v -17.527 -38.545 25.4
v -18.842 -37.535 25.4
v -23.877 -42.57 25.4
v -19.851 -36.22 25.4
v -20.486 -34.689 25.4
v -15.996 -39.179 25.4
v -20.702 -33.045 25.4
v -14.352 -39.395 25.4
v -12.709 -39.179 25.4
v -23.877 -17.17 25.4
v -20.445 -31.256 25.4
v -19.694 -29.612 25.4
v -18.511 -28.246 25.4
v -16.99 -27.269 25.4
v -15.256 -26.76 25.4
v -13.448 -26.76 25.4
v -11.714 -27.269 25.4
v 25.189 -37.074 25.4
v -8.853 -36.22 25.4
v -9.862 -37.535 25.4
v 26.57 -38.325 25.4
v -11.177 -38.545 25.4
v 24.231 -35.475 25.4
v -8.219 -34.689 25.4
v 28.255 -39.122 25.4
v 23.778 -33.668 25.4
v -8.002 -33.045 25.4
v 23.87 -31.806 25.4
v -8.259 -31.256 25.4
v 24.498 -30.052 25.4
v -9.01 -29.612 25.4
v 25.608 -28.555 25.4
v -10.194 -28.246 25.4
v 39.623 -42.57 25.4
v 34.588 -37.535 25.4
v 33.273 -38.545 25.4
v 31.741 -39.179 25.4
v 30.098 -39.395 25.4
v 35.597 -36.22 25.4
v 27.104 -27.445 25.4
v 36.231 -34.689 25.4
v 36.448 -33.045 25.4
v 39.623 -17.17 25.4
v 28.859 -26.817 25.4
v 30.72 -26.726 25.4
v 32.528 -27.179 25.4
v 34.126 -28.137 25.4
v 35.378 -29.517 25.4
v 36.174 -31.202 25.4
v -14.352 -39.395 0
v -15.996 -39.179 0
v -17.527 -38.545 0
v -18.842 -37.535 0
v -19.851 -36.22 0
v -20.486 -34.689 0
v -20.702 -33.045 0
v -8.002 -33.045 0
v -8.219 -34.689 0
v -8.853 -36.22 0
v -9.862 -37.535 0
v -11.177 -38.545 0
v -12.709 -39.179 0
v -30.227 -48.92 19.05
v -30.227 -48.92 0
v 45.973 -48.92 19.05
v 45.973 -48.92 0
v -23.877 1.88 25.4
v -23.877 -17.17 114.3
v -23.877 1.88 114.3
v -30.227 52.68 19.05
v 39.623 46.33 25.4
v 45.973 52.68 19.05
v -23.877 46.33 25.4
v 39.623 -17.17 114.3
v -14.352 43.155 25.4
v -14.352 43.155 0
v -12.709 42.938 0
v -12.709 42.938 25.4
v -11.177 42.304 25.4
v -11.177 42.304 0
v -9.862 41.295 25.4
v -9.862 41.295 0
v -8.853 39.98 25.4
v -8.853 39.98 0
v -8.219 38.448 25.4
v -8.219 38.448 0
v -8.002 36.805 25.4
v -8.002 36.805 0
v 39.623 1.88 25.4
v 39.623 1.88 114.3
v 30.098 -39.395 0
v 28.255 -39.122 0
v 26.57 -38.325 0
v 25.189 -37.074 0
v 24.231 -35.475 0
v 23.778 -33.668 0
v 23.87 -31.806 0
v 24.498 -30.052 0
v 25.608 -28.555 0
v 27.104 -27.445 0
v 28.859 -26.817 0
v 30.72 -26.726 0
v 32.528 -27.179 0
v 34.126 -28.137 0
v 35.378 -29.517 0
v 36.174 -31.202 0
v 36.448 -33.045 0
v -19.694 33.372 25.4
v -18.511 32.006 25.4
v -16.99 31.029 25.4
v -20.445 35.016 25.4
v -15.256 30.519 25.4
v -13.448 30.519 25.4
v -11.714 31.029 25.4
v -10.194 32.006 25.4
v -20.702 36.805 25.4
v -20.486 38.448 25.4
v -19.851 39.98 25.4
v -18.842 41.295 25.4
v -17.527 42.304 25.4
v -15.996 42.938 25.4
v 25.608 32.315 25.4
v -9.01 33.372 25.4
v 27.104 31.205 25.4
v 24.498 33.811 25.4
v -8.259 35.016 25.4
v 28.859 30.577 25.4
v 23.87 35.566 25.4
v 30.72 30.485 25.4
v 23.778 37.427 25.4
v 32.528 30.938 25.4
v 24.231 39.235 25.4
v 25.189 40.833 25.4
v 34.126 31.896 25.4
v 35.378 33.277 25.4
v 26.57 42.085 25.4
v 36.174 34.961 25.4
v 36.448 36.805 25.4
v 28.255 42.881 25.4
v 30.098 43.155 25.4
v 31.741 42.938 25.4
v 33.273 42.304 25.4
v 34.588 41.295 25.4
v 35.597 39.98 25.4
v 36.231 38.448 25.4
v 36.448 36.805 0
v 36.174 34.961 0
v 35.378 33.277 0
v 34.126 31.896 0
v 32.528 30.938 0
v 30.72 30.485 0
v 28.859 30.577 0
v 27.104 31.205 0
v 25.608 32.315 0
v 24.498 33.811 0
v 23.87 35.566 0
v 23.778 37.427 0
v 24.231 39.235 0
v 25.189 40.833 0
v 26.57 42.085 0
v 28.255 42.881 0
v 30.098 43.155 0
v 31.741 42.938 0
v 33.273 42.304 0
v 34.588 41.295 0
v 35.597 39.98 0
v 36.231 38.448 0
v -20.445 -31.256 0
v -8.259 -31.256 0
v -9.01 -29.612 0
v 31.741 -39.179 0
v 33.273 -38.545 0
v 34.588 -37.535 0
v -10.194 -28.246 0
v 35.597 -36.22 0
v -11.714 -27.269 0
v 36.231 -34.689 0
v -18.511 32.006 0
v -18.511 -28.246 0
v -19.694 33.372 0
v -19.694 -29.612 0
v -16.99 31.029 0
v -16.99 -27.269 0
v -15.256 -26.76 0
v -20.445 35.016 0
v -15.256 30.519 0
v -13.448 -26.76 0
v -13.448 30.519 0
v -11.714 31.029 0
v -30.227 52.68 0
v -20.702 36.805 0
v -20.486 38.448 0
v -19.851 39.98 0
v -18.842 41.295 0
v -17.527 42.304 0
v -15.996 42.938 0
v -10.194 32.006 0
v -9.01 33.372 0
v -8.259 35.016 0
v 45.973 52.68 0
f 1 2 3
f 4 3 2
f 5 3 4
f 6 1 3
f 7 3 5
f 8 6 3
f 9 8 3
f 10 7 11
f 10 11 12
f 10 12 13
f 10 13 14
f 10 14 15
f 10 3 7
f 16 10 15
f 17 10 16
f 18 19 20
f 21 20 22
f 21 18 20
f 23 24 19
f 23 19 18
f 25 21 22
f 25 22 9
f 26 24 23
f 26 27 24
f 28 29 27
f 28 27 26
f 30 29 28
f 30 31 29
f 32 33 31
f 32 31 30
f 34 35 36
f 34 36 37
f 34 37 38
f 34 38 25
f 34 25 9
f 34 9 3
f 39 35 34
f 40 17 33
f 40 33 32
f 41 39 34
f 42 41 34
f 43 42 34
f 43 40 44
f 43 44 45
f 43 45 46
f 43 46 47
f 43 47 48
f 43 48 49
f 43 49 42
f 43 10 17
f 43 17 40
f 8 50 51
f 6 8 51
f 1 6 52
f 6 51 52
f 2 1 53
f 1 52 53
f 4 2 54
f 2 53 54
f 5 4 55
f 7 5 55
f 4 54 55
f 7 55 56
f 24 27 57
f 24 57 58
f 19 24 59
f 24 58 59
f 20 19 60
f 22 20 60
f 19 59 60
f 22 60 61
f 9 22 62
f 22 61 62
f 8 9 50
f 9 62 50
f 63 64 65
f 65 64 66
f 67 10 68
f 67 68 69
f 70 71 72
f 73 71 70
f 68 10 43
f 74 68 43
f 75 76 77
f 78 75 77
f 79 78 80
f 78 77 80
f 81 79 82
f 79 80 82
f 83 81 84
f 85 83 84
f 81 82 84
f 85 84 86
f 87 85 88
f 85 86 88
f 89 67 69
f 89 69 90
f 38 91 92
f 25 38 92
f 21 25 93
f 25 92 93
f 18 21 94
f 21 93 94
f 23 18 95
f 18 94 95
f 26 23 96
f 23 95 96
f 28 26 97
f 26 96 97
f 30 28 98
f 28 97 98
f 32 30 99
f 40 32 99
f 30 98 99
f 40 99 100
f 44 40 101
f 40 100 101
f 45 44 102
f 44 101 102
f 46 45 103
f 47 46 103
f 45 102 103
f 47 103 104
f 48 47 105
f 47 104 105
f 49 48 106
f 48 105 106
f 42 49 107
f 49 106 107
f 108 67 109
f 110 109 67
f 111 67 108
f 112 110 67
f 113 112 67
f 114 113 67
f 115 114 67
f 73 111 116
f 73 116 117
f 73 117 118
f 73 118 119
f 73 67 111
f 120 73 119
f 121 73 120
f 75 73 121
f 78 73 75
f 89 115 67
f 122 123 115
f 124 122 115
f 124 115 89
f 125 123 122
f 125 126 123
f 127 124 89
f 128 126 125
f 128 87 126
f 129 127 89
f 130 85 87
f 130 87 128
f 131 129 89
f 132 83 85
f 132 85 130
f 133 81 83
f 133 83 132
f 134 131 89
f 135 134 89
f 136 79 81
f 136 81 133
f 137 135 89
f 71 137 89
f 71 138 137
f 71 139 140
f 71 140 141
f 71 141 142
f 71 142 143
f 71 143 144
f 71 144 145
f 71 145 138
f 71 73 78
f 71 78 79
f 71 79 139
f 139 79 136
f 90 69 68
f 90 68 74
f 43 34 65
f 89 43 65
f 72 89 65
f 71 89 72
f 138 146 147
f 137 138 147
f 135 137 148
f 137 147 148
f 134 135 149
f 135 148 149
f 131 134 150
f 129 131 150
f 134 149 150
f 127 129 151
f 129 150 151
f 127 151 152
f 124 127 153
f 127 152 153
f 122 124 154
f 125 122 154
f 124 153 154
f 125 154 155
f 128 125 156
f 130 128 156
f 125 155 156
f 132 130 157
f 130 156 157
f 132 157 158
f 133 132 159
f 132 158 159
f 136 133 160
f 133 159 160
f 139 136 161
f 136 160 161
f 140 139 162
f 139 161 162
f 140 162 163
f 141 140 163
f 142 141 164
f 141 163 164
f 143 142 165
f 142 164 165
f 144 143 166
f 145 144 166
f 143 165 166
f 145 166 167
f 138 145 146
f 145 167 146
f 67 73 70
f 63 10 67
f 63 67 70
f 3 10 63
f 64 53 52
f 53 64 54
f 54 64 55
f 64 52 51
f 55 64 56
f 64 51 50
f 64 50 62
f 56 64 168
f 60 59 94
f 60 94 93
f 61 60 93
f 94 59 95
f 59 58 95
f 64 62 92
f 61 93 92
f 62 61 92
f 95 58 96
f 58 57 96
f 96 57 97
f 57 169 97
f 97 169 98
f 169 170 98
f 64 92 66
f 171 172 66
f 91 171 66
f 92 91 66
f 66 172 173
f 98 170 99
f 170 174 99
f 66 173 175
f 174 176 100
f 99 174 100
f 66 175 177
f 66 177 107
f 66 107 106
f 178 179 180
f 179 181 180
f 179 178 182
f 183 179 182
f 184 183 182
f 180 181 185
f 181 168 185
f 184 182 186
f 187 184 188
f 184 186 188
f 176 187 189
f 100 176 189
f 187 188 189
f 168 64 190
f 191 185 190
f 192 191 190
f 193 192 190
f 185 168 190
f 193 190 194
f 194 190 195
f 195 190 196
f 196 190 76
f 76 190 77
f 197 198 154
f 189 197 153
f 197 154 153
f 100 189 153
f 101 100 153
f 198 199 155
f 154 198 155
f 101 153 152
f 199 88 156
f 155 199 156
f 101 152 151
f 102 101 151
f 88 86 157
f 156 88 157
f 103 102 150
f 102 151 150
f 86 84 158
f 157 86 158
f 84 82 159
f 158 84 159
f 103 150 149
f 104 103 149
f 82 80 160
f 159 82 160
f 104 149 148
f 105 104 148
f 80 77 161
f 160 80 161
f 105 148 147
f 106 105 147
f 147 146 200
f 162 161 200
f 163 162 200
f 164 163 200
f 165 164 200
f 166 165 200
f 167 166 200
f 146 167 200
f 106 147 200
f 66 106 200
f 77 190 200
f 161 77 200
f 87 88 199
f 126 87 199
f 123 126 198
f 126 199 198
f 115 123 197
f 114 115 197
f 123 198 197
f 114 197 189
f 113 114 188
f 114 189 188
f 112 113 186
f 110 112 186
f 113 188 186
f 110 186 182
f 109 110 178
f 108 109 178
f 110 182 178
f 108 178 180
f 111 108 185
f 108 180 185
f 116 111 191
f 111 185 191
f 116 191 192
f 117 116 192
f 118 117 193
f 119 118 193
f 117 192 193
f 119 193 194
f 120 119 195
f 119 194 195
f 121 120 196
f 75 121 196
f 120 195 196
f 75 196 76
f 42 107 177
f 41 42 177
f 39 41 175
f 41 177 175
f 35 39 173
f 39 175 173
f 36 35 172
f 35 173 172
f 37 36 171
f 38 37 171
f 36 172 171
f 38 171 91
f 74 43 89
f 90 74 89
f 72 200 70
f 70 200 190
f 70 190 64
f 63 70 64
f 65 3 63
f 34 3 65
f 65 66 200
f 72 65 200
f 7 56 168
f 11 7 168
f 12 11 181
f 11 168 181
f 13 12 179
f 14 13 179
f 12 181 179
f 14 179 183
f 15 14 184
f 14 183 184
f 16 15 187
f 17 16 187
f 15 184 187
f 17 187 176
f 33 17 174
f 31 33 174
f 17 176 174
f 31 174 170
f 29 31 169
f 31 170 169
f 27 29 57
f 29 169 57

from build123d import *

# Parameters (mm, degrees)
F0_W     = 38.1
F0_H     = 19.05
F1_DEPTH = 25.4
F2_SIZE  = 6.35
F3_W     = 63.5
F3_H     = 19.05
F4_DEPTH = 88.9


with BuildPart() as f1:
    # F0 (on Top) → F1 (new body)
    with BuildSketch(Plane.XY):
        with BuildLine():
            Line((30.0978315473, 52.679737395), (7.8728315473, 52.679737395))
            Line((7.8728315473, 52.679737395), (7.8728315473, 20.929737395))
            Line((7.8728315473, 20.929737395), (45.9728315473, 20.929737395))
            Line((45.9728315473, 20.929737395), (45.9728315473, 36.804737395))
            Line((45.9728315473, 36.804737395), (36.4478315473, 36.804737395))
            ThreePointArc((36.4478315473, 36.804737395), (25.6077034867, 32.3146093345), (30.0978315473, 43.154737395))
            Line((30.0978315473, 43.154737395), (30.0978315473, 52.679737395))
        make_face()
        with BuildLine():
            Line((45.9728315473, 52.679737395), (30.0978315473, 52.679737395))
            Line((30.0978315473, 52.679737395), (30.0978315473, 43.154737395))
            ThreePointArc((30.0978315473, 43.154737395), (34.5879596078, 41.2948654556), (36.4478315473, 36.804737395))
            Line((36.4478315473, 36.804737395), (45.9728315473, 36.804737395))
            Line((45.9728315473, 36.804737395), (45.9728315473, 52.679737395))
        make_face()
        with BuildLine():
            Line((7.8728315473, 52.679737395), (-14.3521684527, 52.679737395))
            Line((-14.3521684527, 52.679737395), (-14.3521684527, 43.154737395))
            ThreePointArc((-14.3521684527, 43.154737395), (-9.8620403922, 41.2948654556), (-8.0021684527, 36.804737395))
            ThreePointArc((-8.0021684527, 36.804737395), (-14.3521684527, 30.454737395), (-20.7021684527, 36.804737395))
            Line((-20.7021684527, 36.804737395), (-30.2271684527, 36.804737395))
            Line((-30.2271684527, 36.804737395), (-30.2271684527, 20.929737395))
            Line((-30.2271684527, 20.929737395), (7.8728315473, 20.929737395))
            Line((7.8728315473, 20.929737395), (7.8728315473, 52.679737395))
        make_face()
        with BuildLine():
            Line((-14.3521684527, 52.679737395), (-30.2271684527, 52.679737395))
            Line((-30.2271684527, 52.679737395), (-30.2271684527, 36.804737395))
            Line((-30.2271684527, 36.804737395), (-20.7021684527, 36.804737395))
            ThreePointArc((-20.7021684527, 36.804737395), (-18.8422965133, 41.2948654556), (-14.3521684527, 43.154737395))
            Line((-14.3521684527, 43.154737395), (-14.3521684527, 52.679737395))
        make_face()
        with BuildLine():
            Line((45.9728315473, -48.920262605), (45.9728315473, -33.045262605))
            Line((45.9728315473, -33.045262605), (36.4478315473, -33.045262605))
            ThreePointArc((36.4478315473, -33.045262605), (34.5879596078, -37.5353906655), (30.0978315473, -39.395262605))
            Line((30.0978315473, -39.395262605), (30.0978315473, -48.920262605))
            Line((30.0978315473, -48.920262605), (45.9728315473, -48.920262605))
        make_face()
        with BuildLine():
            Line((45.9728315473, 1.879737395), (7.8728315473, 1.879737395))
            Line((7.8728315473, 1.879737395), (7.8728315473, -48.920262605))
            Line((7.8728315473, -48.920262605), (30.0978315473, -48.920262605))
            Line((30.0978315473, -48.920262605), (30.0978315473, -39.395262605))
            ThreePointArc((30.0978315473, -39.395262605), (25.6077034867, -28.5551345444), (36.4478315473, -33.045262605))
            Line((36.4478315473, -33.045262605), (45.9728315473, -33.045262605))
            Line((45.9728315473, -33.045262605), (45.9728315473, 1.879737395))
        make_face()
        with BuildLine():
            Line((-20.7021684527, -33.045262605), (-30.2271684527, -33.045262605))
            Line((-30.2271684527, -33.045262605), (-30.2271684527, -48.920262605))
            Line((-30.2271684527, -48.920262605), (-14.3521684527, -48.920262605))
            Line((-14.3521684527, -48.920262605), (-14.3521684527, -39.395262605))
            ThreePointArc((-14.3521684527, -39.395262605), (-18.8422965133, -37.5353906655), (-20.7021684527, -33.045262605))
        make_face()
        with BuildLine():
            Line((7.8728315473, 1.879737395), (-30.2271684527, 1.879737395))
            Line((-30.2271684527, 1.879737395), (-30.2271684527, -33.045262605))
            Line((-30.2271684527, -33.045262605), (-20.7021684527, -33.045262605))
            ThreePointArc((-20.7021684527, -33.045262605), (-14.3521684527, -26.695262605), (-8.0021684527, -33.045262605))
            ThreePointArc((-8.0021684527, -33.045262605), (-9.8620403922, -37.5353906655), (-14.3521684527, -39.395262605))
            Line((-14.3521684527, -39.395262605), (-14.3521684527, -48.920262605))
            Line((-14.3521684527, -48.920262605), (7.8728315473, -48.920262605))
            Line((7.8728315473, -48.920262605), (7.8728315473, 1.879737395))
        make_face()
        with Locations((-11.1771684527, 11.404737395)):
            Rectangle(F0_W, F0_H)
        with Locations((26.9228315473, 11.404737395)):
            Rectangle(F0_W, F0_H)
    extrude(amount=F1_DEPTH)

    # F2
    f2_edges = [f1.edges().sort_by_distance(p)[0] for p in [
        (7.872832, 52.679737, 25.4),
        (-30.227168, 1.879737, 25.4),
        (7.872832, -48.920263, 25.4),
        (45.972832, 1.879737, 25.4),
    ]]
    chamfer(f2_edges, length=F2_SIZE)

    # F3 (on face) → F4 (join)
    with BuildSketch(Plane.XY.offset(25.4)):
        with Locations((7.8728315473, -7.645262605)):
            Rectangle(F3_W, F3_H)
    extrude(amount=F4_DEPTH)


solid = f1.part
